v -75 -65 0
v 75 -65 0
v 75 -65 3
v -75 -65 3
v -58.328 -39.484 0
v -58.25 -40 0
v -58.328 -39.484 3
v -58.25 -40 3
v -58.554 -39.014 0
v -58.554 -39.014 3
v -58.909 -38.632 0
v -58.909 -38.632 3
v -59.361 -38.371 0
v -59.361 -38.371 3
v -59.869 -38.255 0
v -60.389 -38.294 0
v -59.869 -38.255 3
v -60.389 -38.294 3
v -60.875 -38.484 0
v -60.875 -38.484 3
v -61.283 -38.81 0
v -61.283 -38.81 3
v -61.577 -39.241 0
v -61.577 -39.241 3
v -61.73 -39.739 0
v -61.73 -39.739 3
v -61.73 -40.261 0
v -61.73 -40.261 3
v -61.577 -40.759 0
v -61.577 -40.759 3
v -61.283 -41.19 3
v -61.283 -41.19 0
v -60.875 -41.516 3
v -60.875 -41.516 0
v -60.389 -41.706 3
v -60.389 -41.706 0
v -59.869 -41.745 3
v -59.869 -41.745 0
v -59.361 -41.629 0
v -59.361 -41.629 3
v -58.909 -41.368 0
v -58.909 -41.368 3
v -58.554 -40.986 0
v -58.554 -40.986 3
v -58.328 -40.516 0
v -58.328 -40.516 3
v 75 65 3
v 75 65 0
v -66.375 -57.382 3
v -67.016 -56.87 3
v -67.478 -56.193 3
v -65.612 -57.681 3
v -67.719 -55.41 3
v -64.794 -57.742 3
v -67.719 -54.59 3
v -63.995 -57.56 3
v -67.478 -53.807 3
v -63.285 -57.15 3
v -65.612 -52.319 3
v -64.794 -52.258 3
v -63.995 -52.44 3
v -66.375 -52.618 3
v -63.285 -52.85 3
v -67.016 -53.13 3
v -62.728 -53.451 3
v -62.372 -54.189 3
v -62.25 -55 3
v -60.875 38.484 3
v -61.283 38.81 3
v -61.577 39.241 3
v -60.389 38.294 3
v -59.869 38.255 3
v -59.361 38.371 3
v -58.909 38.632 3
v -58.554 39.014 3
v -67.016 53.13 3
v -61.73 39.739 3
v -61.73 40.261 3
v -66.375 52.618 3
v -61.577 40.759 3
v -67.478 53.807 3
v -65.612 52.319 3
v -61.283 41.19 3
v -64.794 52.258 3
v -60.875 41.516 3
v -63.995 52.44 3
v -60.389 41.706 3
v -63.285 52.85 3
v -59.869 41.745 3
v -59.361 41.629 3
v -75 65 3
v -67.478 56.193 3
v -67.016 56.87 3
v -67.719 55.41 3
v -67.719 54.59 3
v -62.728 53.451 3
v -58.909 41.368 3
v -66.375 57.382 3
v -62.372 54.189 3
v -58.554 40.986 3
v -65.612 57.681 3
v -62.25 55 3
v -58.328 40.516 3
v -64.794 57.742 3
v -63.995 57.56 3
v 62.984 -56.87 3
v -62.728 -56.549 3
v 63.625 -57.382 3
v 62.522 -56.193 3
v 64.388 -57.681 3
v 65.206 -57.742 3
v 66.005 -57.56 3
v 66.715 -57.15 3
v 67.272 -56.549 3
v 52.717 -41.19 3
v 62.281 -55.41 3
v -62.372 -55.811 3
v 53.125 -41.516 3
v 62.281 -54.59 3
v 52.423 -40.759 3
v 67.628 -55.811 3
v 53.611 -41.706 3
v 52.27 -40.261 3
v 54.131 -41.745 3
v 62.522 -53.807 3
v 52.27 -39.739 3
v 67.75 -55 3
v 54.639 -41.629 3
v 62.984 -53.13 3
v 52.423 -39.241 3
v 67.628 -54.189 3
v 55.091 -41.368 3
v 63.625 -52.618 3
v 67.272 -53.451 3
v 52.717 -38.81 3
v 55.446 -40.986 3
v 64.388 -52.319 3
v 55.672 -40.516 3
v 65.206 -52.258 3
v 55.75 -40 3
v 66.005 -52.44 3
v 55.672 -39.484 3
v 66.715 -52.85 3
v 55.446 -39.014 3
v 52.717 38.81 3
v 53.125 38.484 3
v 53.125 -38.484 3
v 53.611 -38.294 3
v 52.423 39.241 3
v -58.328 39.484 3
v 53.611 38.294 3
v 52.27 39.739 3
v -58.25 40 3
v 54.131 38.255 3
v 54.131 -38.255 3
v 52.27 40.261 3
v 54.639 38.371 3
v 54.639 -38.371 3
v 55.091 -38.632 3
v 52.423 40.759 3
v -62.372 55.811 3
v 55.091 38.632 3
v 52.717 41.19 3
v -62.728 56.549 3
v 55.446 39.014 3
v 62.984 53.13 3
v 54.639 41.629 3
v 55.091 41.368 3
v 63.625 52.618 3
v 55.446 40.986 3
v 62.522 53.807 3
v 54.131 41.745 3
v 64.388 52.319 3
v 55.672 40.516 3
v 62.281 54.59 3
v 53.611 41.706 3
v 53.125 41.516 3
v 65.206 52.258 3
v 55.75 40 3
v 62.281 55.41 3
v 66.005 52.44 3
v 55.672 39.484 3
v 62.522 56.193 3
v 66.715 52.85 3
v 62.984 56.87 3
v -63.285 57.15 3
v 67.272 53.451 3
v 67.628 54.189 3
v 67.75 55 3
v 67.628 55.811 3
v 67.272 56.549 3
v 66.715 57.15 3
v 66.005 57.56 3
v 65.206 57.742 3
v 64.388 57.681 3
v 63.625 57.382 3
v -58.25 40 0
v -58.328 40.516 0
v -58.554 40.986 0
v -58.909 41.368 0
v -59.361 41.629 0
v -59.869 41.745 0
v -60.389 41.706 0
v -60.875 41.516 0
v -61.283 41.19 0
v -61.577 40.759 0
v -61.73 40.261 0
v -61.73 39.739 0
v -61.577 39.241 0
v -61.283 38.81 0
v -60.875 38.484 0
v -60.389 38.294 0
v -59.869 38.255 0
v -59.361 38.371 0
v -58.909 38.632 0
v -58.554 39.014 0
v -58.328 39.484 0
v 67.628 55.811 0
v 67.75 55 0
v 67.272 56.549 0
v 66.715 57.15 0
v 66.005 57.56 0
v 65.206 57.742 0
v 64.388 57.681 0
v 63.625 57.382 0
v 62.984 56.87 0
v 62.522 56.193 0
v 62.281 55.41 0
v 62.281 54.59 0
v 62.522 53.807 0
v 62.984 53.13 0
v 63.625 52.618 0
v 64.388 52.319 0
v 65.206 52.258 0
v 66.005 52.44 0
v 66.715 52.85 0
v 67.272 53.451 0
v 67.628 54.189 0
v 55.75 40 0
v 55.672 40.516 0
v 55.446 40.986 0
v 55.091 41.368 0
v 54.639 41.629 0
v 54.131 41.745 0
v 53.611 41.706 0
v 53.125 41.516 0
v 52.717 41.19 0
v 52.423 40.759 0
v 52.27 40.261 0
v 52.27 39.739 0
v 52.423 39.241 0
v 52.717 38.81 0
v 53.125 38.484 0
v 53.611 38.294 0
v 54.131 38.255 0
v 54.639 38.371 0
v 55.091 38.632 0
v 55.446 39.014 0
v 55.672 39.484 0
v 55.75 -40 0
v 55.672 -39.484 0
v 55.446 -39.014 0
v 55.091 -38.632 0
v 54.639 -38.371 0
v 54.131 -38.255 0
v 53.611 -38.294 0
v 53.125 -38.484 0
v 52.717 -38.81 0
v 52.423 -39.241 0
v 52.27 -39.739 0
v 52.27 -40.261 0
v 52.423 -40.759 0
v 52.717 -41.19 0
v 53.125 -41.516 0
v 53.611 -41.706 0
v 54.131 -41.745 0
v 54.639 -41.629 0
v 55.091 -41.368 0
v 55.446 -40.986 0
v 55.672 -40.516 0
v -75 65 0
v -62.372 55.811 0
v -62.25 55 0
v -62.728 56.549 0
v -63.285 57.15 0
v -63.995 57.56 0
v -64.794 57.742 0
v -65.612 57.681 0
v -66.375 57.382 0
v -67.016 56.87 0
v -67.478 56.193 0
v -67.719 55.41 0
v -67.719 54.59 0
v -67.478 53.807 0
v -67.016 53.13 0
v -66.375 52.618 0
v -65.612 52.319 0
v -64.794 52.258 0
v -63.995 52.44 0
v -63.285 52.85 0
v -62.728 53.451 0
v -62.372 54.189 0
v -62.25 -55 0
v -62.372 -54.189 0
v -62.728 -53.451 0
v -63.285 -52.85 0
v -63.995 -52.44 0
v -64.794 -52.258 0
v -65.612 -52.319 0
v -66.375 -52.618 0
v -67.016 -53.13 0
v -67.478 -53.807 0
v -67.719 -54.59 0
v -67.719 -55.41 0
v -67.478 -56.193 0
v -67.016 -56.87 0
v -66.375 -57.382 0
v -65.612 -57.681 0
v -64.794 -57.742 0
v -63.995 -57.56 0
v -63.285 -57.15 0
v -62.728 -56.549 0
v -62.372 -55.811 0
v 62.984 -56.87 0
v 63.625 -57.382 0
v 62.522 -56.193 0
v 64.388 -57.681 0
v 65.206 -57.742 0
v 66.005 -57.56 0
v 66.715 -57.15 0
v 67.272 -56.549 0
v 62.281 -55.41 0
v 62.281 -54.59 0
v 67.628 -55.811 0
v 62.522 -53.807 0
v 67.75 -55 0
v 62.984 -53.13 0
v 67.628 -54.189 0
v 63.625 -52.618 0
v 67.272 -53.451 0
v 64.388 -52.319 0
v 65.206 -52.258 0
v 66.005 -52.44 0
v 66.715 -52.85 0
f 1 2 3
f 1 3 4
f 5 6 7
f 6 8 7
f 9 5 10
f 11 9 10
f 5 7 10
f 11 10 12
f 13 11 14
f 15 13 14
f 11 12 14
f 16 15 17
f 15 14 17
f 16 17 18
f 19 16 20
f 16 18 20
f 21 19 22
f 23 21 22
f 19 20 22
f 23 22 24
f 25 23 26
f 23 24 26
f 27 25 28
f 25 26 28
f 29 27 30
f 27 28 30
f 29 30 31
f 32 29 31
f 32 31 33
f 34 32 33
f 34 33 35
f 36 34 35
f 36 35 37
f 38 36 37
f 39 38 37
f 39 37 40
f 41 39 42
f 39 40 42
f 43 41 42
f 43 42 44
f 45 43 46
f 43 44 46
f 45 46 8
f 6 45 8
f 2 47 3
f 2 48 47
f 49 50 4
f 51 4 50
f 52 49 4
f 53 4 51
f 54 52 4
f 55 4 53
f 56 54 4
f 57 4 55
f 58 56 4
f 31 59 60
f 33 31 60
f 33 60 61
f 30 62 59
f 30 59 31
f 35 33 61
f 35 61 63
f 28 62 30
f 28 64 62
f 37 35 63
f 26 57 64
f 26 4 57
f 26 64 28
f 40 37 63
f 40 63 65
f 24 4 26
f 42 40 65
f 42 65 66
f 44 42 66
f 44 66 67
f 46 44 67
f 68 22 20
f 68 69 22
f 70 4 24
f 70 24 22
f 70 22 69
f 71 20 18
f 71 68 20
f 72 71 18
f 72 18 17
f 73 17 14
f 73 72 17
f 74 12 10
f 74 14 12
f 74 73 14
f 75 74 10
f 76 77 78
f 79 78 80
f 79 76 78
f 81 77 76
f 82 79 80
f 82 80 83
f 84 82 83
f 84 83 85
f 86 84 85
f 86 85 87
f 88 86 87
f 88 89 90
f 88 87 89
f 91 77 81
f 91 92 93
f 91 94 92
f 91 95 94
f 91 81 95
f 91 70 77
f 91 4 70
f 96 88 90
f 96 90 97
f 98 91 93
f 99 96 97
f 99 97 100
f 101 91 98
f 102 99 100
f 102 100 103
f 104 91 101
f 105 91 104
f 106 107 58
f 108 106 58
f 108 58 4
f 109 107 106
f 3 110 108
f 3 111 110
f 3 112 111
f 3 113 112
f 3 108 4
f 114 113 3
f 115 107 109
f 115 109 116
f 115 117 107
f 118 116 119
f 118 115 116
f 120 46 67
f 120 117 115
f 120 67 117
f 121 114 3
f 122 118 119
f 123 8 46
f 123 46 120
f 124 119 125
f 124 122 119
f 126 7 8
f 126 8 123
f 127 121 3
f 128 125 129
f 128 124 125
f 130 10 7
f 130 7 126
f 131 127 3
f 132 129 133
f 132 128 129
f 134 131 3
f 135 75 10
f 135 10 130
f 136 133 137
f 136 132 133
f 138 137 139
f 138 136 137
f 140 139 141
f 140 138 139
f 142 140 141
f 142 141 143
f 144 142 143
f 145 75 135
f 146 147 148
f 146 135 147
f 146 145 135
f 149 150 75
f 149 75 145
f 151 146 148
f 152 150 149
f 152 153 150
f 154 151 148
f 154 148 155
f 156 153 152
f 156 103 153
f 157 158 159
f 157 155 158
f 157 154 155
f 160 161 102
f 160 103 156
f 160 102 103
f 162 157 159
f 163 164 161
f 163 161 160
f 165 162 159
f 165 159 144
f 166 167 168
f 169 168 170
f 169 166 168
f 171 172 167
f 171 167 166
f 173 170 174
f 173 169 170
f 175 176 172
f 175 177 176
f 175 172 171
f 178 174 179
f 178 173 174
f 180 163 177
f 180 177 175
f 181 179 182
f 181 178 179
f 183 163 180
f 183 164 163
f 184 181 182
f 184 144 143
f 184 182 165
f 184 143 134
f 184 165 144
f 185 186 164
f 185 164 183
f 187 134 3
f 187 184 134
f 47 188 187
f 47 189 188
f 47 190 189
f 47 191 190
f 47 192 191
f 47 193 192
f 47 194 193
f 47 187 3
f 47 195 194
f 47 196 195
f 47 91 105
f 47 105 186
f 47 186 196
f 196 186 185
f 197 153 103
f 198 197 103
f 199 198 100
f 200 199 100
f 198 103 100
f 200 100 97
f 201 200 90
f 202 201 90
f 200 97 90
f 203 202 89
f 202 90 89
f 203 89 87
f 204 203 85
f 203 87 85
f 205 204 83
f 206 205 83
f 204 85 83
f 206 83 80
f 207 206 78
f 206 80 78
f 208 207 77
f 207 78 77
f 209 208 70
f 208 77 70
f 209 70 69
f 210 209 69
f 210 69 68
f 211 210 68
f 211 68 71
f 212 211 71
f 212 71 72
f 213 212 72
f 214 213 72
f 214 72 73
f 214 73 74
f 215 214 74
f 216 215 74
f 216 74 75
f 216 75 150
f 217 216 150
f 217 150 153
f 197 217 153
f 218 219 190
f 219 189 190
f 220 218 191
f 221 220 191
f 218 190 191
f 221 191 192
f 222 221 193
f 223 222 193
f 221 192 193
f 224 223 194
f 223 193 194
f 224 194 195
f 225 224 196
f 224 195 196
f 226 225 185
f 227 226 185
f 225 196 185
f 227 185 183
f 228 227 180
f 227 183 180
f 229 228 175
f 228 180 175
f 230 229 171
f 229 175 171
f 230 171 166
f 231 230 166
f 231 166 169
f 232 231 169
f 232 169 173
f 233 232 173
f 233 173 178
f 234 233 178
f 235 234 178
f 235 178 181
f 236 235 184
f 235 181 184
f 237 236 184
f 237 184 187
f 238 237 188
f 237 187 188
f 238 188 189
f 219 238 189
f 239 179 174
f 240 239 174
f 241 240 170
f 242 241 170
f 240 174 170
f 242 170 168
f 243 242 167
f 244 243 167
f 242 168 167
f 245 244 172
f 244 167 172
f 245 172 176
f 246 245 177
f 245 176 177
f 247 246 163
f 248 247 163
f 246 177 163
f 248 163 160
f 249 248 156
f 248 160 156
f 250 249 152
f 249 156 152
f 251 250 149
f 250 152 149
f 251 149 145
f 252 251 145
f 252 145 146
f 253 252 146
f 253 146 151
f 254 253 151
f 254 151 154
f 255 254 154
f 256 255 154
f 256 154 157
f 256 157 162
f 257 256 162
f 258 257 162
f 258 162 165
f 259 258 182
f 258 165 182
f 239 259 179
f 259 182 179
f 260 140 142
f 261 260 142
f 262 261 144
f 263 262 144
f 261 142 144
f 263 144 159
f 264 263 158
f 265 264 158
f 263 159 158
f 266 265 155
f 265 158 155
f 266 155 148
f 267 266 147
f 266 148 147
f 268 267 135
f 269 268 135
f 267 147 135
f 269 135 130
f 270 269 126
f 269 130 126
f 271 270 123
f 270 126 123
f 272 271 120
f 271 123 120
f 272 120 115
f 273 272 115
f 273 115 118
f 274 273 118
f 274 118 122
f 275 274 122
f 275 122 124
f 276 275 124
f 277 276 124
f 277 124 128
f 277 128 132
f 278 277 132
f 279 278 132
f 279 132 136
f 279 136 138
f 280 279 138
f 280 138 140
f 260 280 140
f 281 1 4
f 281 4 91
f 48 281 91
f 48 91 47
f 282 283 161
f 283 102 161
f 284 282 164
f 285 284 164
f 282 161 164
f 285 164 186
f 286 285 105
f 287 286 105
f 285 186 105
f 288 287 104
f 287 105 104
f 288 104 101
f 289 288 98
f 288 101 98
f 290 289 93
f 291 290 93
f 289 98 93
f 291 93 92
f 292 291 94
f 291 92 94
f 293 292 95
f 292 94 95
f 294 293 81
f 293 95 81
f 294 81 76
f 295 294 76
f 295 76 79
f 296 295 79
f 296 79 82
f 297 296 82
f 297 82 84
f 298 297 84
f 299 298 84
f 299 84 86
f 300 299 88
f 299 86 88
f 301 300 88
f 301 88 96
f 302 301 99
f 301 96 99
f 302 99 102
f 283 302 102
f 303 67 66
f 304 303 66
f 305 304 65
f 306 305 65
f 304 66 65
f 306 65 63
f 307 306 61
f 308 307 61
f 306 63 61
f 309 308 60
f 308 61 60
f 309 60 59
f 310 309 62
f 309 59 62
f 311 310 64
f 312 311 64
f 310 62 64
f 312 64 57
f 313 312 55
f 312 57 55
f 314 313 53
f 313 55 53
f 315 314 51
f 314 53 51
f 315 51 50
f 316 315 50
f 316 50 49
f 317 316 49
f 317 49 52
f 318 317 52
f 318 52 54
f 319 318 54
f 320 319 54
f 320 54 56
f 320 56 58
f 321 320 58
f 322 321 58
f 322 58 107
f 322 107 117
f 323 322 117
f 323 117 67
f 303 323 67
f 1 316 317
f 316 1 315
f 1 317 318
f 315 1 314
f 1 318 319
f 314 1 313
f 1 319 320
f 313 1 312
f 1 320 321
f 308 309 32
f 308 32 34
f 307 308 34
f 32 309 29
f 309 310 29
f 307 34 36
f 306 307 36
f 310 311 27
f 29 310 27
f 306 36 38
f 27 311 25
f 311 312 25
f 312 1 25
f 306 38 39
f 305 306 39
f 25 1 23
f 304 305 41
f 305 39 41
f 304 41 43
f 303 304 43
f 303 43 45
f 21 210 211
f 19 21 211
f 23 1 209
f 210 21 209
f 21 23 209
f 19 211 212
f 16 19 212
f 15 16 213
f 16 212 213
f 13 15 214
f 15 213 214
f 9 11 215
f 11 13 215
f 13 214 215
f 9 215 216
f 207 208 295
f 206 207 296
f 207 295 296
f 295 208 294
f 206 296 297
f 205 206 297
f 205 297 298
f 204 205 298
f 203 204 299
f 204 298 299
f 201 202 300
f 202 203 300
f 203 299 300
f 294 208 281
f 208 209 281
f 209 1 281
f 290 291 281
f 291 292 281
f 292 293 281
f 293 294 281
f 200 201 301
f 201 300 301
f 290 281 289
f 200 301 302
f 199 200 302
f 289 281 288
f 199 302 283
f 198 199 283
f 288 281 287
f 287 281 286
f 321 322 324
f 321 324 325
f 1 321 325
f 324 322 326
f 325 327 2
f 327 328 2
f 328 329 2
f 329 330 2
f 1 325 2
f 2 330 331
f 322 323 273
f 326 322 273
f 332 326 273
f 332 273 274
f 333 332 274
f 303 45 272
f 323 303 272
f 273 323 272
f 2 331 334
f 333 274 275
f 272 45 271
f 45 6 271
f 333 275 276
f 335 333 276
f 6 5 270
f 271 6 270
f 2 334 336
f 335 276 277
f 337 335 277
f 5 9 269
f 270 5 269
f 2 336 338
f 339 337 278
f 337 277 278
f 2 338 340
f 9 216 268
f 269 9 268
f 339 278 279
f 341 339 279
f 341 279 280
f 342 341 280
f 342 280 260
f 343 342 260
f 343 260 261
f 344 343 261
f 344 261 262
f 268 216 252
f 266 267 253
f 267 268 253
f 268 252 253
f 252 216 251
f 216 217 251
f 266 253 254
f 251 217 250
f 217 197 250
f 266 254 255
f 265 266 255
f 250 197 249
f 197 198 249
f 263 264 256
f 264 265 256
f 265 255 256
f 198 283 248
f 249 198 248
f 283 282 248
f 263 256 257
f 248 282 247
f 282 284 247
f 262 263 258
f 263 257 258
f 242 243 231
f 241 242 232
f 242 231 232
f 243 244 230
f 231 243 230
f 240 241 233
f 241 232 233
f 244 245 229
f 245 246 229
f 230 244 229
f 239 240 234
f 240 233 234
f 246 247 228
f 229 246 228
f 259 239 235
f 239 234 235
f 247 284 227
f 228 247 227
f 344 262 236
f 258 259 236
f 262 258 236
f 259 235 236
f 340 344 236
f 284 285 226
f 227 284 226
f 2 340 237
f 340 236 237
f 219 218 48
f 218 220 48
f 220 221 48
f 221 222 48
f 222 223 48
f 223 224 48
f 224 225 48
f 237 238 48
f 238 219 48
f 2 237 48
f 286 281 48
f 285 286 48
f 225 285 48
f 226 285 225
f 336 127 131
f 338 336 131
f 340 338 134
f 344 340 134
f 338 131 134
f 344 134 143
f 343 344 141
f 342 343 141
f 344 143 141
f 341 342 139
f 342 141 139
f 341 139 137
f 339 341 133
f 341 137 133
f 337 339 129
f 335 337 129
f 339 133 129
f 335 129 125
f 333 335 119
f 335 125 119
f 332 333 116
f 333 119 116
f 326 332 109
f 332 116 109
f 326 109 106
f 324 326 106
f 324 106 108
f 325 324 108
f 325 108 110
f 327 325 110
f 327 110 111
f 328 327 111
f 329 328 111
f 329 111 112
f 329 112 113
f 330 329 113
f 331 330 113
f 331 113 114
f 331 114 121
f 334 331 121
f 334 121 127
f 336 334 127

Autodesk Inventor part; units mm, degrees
ref_plane "YZ Plane" through (0, 0, 0) normal (1, 0, 0) x (0, 1, 0)
ref_plane "XZ Plane" through (0, 0, 0) normal (0, 1, 0) x (-1, 0, 0)
ref_plane "XY Plane" through (0, 0, 0) normal (0, 0, 1) x (1, 0, 0)
sketch "Sketch1" plane through (0, 0, 0) normal (0, 0, 1) x (1, 0, 0)
  line L0 (-75, 65) -> (75, 65)
  line L1 (75, 65) -> (75, -65)
  line L2 (75, -65) -> (-75, -65)
  line L3 (-75, -65) -> (-75, 65)
  point P0 (0, 0)
  dimension "d0" = 150
  dimension "d1" = 130
  dimension "d2" = 65
  dimension "d3" = 75
extrude "Extrusion1" add sketch "Sketch1" along normal blind 3
sketch "Sketch2" plane through (0, 0, 3) normal (0, 0, 1) x (1, 0, 0)
  circle A0 centre (-60, 40) radius 1.75
  line L0 (75, 65) -> (-75, 65) projected
  line L1 (-75, 65) -> (-75, -65) projected
  point P0 (0, 0)
  dimension "d6" = 3.5
  dimension "d15" = 25
  dimension "d16" = 15
extrude "Extrusion2" cut sketch "Sketch2" against normal through all
pattern_linear "Rectangular Pattern1" count 2 spacing 114 along (1, 0, 0) count 2 spacing 80 along (0, -1, 0) of "Extrusion2"
sketch "Sketch3" plane through (0, 0, 3) normal (0, 0, 1) x (1, 0, 0)
  line L0 (75, 65) -> (-75, 65) projected
  line L1 (-75, 65) -> (-75, -65) projected
  circle A0 centre (-65, 55) radius 2.75
  point P0 (0, 0)
  dimension "d17" = 5.5
  dimension "d18" = 10
  dimension "d19" = 10
extrude "Extrusion3" cut sketch "Sketch3" against normal through all
pattern_linear "Rectangular Pattern2" count 2 spacing 130 along (1, 0, 0) count 2 spacing 110 along (0, -1, 0) of "Extrusion3"
equation "\"d2\" = 0.5 * d1"
equation "\"d3\" = 0.5 * d0"
properties part number "part_plate_rear" material "Polycarbonate, Clear"
